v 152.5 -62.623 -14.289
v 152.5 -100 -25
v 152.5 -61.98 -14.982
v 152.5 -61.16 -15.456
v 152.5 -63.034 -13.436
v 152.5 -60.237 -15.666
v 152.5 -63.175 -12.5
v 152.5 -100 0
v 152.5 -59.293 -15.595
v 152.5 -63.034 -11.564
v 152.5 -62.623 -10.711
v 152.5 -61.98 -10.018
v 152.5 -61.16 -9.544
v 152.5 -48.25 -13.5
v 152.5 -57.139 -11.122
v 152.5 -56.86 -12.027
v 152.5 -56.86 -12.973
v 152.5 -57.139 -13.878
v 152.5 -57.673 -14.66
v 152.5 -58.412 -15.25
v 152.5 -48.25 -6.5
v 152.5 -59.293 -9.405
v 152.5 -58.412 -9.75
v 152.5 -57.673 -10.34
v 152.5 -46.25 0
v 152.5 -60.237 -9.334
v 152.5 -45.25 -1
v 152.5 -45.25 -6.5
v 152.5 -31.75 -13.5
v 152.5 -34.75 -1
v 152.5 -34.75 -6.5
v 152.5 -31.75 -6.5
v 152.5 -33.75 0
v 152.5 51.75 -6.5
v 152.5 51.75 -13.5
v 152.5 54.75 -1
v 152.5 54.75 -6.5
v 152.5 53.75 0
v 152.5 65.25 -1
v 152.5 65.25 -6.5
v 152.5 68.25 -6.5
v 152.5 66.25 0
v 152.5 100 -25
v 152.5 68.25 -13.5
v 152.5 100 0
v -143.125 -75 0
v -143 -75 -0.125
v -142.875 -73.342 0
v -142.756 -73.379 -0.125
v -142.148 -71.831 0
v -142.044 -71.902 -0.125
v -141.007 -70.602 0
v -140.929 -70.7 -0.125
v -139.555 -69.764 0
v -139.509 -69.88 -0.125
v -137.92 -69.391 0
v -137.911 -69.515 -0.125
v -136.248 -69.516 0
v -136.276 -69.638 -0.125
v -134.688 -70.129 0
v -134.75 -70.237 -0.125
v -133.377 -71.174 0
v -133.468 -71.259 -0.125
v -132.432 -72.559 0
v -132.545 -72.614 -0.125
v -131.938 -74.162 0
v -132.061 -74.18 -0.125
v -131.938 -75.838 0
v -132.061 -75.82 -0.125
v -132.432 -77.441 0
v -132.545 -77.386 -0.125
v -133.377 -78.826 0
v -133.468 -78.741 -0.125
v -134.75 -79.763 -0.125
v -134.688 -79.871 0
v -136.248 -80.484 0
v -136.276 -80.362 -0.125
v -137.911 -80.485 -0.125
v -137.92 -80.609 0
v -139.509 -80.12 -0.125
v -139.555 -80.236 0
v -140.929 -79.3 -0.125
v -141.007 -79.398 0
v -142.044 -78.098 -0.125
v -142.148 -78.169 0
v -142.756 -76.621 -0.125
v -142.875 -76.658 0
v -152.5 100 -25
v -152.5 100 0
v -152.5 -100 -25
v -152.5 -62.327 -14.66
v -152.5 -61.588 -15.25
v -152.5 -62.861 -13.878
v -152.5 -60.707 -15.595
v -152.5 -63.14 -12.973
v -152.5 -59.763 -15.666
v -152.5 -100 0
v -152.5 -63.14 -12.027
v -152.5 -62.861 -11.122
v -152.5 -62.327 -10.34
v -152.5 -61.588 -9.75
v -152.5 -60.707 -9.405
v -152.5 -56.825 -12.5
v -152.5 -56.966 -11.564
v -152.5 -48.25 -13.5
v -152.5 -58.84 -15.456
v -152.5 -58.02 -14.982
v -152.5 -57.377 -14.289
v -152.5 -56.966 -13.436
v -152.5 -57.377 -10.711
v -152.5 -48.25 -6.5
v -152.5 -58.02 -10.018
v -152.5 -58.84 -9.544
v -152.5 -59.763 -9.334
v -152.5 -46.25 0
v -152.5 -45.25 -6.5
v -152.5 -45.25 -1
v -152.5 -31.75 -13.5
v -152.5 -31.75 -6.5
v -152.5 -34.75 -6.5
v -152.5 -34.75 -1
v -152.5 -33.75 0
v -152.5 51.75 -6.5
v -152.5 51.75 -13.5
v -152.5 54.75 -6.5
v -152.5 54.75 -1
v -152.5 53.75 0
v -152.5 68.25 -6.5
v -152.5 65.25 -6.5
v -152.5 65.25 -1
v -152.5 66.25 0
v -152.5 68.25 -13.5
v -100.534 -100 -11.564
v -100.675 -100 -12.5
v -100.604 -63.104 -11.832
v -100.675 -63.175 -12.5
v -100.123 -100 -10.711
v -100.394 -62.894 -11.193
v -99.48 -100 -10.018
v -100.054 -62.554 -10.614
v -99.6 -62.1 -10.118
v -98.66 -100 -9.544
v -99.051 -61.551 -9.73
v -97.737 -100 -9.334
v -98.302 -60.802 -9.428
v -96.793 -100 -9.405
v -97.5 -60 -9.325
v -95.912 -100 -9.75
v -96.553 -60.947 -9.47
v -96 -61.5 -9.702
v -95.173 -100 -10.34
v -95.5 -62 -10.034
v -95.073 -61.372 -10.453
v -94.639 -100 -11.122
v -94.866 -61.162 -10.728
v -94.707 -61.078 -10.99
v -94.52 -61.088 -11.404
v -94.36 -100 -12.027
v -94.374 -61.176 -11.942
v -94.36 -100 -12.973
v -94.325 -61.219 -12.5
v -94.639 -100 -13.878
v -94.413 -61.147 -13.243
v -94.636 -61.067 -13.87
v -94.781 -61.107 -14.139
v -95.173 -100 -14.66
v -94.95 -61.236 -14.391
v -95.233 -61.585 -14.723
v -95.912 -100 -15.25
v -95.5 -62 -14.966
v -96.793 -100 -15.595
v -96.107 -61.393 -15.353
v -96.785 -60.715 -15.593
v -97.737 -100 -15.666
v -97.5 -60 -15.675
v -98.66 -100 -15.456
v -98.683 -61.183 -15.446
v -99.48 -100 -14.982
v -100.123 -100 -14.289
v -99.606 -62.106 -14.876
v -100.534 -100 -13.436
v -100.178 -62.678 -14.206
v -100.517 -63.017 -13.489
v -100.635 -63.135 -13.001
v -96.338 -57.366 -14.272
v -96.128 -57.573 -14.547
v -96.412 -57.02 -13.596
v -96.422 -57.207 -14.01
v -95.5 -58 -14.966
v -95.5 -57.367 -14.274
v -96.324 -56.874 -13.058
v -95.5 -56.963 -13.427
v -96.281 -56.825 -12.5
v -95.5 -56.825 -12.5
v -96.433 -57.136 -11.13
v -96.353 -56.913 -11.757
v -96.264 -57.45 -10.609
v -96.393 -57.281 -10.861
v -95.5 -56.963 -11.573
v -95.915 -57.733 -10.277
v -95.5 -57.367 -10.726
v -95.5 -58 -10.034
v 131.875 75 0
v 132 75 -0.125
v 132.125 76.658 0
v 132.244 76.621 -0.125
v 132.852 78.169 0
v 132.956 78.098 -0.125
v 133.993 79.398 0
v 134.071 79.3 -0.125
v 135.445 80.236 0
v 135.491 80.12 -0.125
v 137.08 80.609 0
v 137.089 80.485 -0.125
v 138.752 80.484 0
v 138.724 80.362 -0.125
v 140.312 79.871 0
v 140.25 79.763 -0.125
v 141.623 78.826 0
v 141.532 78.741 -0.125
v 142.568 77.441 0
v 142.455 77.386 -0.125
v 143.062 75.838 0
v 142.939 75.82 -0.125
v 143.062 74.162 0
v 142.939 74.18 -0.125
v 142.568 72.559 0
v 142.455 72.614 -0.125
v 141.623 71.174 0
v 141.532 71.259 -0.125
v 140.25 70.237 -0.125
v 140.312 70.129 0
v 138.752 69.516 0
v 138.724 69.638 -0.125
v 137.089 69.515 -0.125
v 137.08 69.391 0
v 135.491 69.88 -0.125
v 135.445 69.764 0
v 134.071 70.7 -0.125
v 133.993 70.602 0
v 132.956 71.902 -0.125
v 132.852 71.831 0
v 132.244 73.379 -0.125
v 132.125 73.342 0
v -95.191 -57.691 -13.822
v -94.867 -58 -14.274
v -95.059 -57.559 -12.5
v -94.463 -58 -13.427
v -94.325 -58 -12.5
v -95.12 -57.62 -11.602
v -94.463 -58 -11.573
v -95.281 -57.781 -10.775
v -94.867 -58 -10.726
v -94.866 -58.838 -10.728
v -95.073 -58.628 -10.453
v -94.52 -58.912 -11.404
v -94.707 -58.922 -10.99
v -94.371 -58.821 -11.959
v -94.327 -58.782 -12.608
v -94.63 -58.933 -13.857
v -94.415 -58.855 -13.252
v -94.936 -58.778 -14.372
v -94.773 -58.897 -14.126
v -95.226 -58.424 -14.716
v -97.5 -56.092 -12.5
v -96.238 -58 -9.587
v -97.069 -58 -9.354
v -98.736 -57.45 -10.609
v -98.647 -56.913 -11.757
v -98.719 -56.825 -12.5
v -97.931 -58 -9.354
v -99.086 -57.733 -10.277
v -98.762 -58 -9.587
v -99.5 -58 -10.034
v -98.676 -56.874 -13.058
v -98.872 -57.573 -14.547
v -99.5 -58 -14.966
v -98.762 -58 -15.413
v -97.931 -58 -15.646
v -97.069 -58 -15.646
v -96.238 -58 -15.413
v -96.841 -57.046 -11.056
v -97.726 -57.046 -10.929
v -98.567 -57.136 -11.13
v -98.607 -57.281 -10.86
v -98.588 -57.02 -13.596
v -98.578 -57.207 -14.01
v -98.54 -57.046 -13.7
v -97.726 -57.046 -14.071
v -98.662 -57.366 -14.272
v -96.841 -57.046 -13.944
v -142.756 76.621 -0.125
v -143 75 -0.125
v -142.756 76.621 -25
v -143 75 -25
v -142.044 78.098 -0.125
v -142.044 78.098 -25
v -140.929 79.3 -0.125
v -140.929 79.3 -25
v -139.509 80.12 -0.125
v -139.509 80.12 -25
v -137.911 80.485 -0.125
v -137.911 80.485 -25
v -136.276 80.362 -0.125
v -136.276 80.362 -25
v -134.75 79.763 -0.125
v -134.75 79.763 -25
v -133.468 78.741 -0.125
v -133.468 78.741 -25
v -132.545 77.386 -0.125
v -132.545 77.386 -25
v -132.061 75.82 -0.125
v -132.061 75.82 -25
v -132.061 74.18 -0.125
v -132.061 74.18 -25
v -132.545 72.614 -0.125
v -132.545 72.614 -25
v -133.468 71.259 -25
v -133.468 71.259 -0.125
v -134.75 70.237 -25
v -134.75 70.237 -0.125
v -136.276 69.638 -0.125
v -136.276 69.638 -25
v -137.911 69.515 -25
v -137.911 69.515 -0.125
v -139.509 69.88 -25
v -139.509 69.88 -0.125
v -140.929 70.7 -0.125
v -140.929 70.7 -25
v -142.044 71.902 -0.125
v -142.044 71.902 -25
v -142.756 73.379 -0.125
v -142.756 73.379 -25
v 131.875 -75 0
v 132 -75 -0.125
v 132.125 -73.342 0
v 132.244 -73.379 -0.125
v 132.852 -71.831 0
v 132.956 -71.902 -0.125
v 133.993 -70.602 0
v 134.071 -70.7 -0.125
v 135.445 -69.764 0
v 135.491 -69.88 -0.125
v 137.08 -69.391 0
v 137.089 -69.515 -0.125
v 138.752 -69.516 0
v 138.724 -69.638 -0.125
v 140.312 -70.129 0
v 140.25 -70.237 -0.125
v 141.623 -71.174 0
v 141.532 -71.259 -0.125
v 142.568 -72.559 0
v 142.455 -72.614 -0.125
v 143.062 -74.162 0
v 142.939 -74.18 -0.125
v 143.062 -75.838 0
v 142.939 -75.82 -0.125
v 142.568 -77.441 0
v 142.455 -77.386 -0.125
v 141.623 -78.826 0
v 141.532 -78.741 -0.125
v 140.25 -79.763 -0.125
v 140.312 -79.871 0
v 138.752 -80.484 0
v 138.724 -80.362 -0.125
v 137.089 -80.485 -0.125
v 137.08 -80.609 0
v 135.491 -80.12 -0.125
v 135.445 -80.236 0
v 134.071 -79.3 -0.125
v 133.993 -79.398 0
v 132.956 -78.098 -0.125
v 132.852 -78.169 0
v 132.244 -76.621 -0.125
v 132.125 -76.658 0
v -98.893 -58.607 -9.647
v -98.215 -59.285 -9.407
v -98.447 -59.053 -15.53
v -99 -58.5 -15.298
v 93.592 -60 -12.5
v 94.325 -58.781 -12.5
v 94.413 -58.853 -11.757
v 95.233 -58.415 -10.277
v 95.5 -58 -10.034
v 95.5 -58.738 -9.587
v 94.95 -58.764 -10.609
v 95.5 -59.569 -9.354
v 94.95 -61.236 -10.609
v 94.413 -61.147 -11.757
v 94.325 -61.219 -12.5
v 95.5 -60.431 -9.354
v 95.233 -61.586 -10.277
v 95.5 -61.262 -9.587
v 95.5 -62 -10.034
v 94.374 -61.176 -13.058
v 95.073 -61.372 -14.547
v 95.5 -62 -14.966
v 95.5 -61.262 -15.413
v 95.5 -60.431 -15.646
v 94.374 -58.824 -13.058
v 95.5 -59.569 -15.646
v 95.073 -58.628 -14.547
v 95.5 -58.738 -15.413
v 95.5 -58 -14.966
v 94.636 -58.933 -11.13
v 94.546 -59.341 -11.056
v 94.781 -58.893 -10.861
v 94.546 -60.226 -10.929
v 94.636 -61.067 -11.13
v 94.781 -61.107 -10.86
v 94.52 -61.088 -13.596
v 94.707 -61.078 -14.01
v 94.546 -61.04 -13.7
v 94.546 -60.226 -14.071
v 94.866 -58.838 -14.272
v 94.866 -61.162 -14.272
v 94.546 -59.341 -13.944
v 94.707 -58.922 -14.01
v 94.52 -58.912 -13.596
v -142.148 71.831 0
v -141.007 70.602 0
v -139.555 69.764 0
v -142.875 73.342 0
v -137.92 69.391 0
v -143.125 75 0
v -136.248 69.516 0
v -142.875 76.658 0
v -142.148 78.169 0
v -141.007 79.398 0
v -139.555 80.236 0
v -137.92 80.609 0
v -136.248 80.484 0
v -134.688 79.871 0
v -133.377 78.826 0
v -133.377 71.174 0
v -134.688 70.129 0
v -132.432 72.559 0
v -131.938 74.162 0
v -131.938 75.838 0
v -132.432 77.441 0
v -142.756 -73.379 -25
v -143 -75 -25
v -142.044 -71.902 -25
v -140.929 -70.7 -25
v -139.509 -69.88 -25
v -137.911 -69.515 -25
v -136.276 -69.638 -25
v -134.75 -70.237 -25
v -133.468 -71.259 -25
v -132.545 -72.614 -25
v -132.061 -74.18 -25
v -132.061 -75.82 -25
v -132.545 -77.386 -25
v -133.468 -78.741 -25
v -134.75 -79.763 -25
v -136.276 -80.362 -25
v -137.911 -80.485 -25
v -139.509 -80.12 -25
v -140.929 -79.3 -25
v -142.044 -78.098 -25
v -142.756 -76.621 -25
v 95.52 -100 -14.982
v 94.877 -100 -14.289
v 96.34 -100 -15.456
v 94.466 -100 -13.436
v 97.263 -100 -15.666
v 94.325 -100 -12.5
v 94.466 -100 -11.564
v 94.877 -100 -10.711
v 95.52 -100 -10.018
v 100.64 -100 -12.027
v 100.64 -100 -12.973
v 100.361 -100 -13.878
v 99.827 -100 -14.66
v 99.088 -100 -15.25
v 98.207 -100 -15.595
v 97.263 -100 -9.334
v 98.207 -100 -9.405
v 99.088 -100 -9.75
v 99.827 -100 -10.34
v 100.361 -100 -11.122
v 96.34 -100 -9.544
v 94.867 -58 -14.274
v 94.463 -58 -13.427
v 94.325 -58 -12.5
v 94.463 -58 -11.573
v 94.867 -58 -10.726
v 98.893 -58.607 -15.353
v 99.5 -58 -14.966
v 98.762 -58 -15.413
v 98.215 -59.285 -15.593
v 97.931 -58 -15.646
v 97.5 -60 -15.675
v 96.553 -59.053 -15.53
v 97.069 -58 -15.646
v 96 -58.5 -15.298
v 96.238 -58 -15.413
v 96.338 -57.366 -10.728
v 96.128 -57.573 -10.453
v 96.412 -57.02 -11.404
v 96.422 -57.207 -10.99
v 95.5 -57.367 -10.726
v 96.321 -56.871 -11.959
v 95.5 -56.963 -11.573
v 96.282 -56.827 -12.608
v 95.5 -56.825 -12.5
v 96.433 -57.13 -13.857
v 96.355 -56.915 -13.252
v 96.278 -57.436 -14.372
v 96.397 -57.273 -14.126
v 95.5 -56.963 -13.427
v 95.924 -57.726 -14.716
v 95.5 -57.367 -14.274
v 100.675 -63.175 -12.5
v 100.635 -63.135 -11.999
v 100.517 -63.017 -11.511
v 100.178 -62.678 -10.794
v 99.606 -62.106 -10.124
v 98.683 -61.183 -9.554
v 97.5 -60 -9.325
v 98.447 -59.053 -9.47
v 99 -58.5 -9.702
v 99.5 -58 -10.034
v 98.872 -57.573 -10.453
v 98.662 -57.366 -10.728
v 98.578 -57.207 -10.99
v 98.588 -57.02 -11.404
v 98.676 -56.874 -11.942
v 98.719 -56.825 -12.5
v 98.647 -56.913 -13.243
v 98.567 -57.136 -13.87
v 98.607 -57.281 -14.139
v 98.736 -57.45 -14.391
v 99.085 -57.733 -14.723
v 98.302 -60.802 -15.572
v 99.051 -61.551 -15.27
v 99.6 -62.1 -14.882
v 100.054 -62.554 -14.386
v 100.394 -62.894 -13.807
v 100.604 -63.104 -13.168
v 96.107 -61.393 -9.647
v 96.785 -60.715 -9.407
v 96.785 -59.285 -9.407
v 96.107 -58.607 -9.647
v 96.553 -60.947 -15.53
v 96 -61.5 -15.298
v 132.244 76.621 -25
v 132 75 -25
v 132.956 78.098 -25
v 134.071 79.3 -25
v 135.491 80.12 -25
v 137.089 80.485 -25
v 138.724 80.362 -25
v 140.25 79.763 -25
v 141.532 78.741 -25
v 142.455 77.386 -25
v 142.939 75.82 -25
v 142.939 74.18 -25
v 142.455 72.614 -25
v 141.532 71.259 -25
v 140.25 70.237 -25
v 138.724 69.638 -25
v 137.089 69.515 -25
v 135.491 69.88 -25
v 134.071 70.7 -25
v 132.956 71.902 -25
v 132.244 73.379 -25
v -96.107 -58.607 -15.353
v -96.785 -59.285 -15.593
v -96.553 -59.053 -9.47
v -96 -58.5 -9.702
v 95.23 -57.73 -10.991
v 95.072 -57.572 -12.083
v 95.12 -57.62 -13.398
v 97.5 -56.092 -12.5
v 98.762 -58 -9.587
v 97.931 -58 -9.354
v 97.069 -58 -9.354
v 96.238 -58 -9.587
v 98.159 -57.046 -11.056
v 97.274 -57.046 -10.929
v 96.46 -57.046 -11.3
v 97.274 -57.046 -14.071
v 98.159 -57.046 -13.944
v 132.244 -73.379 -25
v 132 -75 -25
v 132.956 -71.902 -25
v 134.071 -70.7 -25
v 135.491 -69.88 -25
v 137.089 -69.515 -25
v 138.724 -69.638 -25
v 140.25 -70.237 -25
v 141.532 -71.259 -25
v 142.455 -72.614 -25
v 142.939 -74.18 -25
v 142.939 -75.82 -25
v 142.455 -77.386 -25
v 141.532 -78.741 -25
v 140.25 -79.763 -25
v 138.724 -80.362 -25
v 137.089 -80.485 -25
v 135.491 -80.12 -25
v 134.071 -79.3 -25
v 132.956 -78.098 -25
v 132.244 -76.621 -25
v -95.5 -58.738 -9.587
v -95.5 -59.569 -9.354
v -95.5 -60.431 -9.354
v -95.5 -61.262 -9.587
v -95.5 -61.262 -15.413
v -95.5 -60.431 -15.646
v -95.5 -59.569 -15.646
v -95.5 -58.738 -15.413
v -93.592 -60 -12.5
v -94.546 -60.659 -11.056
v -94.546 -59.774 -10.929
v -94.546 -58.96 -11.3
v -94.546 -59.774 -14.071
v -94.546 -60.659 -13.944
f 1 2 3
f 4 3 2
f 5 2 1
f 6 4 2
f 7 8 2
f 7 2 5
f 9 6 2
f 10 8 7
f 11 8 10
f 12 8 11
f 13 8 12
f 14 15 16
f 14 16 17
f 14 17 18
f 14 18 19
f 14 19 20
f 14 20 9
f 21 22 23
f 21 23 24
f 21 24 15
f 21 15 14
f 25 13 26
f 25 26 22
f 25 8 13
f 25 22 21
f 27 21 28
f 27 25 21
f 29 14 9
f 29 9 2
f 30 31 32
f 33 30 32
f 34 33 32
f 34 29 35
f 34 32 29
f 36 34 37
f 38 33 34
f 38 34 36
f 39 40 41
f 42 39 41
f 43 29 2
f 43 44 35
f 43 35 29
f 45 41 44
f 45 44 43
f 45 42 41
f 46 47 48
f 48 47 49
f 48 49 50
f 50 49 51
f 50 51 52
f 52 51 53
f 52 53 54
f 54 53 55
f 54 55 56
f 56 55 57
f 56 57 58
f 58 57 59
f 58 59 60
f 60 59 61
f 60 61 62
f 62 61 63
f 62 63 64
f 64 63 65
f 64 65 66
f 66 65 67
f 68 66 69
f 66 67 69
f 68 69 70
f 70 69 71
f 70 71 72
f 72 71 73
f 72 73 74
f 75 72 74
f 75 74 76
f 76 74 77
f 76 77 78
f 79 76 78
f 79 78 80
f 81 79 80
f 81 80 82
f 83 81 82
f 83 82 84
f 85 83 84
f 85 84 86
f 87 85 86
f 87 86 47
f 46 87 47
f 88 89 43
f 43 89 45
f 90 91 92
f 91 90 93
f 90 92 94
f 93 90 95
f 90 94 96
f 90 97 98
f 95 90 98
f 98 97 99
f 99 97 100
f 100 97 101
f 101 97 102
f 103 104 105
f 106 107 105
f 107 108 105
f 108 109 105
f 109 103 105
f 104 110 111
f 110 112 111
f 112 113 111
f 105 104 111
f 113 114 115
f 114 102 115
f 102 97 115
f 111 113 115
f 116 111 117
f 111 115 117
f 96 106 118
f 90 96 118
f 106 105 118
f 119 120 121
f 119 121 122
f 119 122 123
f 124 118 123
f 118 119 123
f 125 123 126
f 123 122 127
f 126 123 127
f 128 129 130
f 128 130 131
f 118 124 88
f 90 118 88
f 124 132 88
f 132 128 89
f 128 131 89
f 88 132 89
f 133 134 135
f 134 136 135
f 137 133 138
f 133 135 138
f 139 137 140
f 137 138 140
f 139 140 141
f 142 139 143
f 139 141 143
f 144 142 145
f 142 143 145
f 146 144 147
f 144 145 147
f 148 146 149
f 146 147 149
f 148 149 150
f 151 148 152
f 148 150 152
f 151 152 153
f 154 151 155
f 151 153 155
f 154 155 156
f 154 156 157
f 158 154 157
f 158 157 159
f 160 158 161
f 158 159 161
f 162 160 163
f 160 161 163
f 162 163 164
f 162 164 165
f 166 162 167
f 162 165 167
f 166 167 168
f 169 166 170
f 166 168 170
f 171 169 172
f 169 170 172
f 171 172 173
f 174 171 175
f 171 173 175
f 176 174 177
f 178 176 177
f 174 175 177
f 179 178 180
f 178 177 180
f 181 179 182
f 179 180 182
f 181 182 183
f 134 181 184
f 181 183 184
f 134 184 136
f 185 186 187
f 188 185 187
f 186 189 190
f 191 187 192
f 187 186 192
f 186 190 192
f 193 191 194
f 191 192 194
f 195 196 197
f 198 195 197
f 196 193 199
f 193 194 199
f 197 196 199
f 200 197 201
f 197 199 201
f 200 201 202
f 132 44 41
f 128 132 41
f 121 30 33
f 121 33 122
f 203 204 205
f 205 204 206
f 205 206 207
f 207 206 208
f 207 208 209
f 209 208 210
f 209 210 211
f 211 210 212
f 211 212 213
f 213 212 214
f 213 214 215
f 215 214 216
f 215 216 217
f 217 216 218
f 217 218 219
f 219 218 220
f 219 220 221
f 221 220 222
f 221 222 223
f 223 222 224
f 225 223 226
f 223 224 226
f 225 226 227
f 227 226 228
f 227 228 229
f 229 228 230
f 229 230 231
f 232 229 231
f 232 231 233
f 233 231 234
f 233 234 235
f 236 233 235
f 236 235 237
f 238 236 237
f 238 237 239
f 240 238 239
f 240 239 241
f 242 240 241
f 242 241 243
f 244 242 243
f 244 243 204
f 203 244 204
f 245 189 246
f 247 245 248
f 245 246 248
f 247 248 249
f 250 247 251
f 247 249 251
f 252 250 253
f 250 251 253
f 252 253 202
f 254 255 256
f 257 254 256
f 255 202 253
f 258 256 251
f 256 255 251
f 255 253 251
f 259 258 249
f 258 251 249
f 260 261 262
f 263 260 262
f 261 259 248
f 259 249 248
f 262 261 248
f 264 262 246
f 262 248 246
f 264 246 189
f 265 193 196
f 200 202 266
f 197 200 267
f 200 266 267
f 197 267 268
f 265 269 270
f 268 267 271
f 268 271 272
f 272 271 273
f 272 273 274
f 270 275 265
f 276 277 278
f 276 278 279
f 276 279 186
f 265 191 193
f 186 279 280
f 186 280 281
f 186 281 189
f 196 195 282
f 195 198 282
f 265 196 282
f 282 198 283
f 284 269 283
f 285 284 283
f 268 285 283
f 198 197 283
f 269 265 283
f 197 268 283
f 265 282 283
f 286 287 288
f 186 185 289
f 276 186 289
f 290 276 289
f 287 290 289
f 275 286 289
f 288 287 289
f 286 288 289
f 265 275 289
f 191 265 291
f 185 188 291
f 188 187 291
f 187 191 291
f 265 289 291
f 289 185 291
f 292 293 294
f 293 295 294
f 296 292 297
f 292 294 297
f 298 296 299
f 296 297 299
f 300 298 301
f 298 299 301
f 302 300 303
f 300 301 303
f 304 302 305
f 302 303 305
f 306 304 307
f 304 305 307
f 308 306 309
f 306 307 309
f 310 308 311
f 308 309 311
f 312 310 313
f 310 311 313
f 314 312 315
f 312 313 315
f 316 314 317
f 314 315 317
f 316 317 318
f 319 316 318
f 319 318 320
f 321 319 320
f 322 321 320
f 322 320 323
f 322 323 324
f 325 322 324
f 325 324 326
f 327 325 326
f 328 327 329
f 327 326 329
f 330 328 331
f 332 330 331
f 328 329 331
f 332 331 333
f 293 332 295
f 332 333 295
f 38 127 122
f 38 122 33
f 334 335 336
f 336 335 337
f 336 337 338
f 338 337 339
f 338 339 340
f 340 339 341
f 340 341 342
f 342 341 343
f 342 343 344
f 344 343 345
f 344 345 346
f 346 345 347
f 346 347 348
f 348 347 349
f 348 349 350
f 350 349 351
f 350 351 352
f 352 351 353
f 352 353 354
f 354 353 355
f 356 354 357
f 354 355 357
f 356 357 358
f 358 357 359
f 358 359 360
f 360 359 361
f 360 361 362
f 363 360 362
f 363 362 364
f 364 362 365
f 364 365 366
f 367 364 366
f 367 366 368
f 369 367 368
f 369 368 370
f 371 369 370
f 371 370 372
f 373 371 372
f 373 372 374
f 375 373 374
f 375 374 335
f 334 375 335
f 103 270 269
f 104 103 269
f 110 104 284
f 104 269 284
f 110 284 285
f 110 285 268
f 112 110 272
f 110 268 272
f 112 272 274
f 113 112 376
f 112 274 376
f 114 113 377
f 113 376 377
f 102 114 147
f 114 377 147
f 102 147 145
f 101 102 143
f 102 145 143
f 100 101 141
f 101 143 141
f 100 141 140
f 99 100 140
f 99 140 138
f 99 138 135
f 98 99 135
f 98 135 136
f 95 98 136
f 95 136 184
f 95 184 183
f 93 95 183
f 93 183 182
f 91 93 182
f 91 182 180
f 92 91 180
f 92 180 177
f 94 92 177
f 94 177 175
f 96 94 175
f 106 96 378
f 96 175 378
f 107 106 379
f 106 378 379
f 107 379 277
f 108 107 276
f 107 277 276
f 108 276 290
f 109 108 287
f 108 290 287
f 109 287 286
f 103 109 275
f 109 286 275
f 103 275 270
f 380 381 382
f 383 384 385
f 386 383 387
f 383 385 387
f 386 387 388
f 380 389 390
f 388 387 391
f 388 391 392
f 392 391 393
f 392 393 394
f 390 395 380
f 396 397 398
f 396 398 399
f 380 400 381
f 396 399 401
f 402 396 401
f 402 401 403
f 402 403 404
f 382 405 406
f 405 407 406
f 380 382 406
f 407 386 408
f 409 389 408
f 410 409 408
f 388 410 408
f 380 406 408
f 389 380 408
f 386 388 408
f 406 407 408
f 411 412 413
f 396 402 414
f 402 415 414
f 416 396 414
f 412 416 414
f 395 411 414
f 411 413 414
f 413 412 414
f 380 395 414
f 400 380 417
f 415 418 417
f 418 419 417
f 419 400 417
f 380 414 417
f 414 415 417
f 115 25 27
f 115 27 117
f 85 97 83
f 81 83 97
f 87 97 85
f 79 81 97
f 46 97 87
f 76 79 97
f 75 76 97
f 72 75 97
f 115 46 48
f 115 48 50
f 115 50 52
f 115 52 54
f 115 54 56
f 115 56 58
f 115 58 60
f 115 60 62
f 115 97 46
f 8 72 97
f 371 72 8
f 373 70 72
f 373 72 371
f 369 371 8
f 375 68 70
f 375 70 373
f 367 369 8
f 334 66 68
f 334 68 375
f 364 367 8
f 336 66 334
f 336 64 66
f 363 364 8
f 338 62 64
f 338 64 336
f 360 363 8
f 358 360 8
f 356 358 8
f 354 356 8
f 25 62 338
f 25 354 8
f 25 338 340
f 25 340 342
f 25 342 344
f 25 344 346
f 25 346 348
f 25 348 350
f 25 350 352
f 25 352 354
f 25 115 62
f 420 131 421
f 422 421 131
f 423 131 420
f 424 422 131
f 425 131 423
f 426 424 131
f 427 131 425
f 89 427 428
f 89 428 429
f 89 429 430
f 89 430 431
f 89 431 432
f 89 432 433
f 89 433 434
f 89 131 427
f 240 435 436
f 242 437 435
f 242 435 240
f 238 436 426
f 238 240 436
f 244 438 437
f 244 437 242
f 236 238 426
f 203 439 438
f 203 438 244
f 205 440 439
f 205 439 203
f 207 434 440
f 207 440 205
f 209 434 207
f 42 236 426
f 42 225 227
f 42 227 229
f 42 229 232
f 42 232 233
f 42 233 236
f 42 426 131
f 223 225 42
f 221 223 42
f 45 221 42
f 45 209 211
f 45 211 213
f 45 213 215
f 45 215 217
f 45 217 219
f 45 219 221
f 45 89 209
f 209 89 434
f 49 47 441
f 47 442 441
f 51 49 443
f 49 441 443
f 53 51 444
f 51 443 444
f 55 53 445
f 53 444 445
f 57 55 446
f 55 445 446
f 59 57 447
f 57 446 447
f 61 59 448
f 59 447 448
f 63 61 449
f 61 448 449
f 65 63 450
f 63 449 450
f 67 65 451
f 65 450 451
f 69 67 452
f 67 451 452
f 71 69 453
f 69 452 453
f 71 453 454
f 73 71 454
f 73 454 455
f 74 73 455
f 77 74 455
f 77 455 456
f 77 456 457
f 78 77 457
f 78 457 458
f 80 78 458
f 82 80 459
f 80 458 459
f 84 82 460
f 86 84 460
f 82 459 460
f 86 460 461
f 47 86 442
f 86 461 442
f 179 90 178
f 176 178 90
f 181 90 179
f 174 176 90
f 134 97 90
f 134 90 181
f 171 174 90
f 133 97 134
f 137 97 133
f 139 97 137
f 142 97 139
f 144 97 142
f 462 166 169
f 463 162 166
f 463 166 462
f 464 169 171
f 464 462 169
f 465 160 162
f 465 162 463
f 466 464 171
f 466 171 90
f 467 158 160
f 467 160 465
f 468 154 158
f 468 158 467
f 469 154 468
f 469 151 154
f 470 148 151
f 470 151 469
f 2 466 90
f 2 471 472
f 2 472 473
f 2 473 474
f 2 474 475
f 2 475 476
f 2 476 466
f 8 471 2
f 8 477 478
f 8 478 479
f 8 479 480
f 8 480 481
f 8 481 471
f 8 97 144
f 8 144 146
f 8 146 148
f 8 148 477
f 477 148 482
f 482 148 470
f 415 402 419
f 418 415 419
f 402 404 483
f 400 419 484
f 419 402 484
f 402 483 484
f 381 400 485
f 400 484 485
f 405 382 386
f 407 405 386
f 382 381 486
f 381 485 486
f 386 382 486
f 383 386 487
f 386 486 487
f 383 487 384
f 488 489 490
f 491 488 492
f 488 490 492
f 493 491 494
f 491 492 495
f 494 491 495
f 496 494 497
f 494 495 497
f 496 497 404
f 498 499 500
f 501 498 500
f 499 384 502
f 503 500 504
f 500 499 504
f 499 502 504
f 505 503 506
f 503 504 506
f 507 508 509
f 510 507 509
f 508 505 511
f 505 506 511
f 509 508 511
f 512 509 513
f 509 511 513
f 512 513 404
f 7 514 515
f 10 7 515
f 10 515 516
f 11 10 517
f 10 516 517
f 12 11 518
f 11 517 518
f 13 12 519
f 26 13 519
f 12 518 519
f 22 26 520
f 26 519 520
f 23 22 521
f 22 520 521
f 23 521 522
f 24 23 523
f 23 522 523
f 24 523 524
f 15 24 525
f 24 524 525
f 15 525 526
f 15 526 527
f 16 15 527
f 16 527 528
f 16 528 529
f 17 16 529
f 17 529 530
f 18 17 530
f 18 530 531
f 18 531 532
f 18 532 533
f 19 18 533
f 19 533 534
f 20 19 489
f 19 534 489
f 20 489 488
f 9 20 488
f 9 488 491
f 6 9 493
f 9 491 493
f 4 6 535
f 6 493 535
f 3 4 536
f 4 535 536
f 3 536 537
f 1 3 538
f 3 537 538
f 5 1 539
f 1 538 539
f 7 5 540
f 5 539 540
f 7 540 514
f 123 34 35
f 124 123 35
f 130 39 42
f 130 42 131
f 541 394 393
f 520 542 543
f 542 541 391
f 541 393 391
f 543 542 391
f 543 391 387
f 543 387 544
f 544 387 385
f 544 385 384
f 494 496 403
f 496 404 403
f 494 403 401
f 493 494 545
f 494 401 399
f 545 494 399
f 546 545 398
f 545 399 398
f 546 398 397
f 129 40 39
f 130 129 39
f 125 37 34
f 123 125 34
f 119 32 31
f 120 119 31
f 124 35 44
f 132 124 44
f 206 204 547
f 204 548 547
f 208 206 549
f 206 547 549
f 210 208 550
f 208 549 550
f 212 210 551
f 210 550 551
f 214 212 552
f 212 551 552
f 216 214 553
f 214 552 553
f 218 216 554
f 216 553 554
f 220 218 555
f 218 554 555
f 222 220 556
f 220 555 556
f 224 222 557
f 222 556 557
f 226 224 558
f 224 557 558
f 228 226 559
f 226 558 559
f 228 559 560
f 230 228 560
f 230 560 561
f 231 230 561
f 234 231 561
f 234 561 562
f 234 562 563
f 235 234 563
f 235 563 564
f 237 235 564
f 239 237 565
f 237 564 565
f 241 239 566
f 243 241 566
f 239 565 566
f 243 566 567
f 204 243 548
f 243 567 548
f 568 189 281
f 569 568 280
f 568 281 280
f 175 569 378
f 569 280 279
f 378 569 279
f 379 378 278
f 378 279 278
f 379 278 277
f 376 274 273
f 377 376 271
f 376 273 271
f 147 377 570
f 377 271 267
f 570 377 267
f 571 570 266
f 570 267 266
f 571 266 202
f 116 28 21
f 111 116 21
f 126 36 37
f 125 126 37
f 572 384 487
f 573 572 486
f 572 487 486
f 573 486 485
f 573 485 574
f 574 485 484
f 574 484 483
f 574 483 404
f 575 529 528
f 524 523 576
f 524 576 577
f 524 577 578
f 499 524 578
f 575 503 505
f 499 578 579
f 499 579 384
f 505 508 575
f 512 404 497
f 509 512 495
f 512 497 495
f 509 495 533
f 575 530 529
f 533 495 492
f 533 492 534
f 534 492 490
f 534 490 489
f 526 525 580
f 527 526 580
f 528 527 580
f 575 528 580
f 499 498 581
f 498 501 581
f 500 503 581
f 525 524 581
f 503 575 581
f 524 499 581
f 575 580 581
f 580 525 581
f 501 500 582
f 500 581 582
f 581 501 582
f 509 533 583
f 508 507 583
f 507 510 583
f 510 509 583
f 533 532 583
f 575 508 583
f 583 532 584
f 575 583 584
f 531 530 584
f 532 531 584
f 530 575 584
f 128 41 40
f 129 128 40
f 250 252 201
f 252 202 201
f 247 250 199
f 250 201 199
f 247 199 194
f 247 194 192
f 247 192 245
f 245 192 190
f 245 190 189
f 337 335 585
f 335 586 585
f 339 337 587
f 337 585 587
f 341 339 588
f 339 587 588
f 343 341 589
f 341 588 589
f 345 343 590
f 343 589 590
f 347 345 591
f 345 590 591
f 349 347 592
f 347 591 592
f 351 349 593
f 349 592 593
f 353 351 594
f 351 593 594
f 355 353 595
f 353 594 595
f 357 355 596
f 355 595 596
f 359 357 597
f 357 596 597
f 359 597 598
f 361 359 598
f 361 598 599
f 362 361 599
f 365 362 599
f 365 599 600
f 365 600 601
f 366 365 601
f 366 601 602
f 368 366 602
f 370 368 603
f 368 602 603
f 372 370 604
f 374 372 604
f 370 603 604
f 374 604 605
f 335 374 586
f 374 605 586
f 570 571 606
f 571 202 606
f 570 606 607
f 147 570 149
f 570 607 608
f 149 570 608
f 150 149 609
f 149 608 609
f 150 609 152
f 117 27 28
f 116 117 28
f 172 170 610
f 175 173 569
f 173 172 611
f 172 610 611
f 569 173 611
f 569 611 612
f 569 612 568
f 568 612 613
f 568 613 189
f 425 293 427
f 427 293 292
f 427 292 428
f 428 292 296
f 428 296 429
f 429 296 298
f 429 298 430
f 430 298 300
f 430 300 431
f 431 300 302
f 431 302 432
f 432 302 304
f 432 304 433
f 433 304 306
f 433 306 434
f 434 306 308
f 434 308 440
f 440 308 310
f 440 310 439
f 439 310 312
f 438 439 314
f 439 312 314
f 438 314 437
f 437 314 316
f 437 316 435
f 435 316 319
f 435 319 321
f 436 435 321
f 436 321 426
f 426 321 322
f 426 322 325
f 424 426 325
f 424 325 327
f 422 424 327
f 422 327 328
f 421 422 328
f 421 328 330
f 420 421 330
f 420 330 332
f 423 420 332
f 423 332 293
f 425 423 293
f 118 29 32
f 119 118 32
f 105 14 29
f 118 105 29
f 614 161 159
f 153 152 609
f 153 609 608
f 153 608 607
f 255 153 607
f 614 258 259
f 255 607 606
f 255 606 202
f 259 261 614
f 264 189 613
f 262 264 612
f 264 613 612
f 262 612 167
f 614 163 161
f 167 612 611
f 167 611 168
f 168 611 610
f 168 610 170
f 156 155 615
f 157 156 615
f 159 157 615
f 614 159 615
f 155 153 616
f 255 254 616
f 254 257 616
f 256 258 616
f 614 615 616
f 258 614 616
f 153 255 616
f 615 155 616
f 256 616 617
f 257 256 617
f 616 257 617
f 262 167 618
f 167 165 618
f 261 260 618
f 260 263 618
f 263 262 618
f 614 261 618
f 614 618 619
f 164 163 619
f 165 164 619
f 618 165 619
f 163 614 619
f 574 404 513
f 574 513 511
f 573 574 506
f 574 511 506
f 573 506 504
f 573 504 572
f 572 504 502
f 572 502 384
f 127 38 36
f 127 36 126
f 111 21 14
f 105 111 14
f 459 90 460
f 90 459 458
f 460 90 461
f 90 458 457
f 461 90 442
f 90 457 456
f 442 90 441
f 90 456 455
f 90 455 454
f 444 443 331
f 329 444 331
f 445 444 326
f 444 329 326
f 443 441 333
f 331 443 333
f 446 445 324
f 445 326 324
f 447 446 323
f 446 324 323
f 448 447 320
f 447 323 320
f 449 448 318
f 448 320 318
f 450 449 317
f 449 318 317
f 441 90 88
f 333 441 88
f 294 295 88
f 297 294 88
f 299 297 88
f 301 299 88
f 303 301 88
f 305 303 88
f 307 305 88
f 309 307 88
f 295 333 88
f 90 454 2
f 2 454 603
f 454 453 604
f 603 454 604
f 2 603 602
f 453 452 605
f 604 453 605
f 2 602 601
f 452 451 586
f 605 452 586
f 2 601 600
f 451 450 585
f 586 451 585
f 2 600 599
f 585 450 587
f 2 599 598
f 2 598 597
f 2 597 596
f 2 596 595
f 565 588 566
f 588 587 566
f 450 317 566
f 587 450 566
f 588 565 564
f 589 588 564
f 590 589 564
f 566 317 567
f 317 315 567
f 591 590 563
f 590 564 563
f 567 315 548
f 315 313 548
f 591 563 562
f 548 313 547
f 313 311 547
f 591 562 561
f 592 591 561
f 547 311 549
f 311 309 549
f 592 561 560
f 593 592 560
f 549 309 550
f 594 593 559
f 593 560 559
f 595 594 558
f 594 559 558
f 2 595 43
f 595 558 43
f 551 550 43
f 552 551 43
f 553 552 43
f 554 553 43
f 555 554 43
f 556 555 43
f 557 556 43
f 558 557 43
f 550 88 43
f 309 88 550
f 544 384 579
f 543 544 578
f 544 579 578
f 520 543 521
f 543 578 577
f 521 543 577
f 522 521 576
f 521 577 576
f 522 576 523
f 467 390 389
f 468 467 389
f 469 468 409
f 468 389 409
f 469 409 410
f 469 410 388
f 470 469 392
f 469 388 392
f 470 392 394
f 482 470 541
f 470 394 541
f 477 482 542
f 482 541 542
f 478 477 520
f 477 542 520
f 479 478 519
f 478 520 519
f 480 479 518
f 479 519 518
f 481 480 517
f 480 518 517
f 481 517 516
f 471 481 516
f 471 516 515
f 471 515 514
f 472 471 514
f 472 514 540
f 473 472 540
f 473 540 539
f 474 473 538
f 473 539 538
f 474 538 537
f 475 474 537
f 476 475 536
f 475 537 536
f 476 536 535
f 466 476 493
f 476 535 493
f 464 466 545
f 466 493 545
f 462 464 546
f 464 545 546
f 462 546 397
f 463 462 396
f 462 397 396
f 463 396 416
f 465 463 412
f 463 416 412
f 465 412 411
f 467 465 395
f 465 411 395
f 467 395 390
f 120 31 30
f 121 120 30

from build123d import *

# Parameters (mm, degrees)
F0_W            = 305
F0_H            = 200
F1_DEPTH        = 25
F3_D            = 11
F3_CSINK_D      = 11.25
F3_CSINK_ANGLE  = 90
F5_DEPTH        = 152.501
F5_DEPTH_BACK   = 152.501
F6_SIZE         = 1
F10_D           = 6.35
F10_DEPTH       = 42
F10_TIP         = 1.9077324654
F11_D           = 6.35
F11_DEPTH       = 57
F11_TIP         = 1.9077324654
F11_ON_F8_D     = 6.35
F11_ON_F8_DEPTH = 57
F11_ON_F8_TIP   = 1.9077324654


with BuildPart() as f1:
    # F0 (on Top) → F1 (new body)
    with BuildSketch(Plane.XY):
        Rectangle(F0_W, F0_H)
    extrude(amount=-F1_DEPTH)

    # F3 (through all)
    with Locations(Plane.XY):
        with Locations((-137.5, 75), (137.5, 75), (137.5, -75), (-137.5, -75)):
            CounterSinkHole(F3_D / 2, F3_CSINK_D / 2, counter_sink_angle=F3_CSINK_ANGLE)

    # F4 (on Right) → F5 (cut, two sides)
    with BuildSketch(Plane.YZ) as f5_sk:
        Polygon((-34.75, 0), (-40, 0), (-45.25, 0), (-45.25, -6.5), (-48.25, -6.5), (-48.25, -13.5), (-40, -13.5), (-31.75, -13.5), (-31.75, -6.5), (-34.75, -6.5), align=None)
        Polygon((65.25, 0), (60, 0), (54.75, 0), (54.75, -6.5), (51.75, -6.5), (51.75, -13.5), (60, -13.5), (68.25, -13.5), (68.25, -6.5), (65.25, -6.5), align=None)
    extrude(amount=-F5_DEPTH, mode=Mode.SUBTRACT)
    extrude(f5_sk.sketch, amount=F5_DEPTH_BACK, mode=Mode.SUBTRACT)

    # F6
    f6_edges = [f1.edges().sort_by_distance(p)[0] for p in [
        (0, -34.75, 0),
        (0, -45.25, 0),
        (0, 65.25, 0),
        (0, 54.75, 0),
    ]]
    chamfer(f6_edges, length=F6_SIZE)

    # F10
    with Locations(Plane.XZ.offset(100)):
        with Locations((97.5, -12.5), (-97.5, -12.5)):
            Hole(F10_D / 2, depth=F10_DEPTH)
            with Locations((0, 0, -(F10_DEPTH + F10_TIP / 2))):  # 118° drill point
                Cone(0, F10_D / 2, F10_TIP, mode=Mode.SUBTRACT)

    # F11
    with Locations(Plane(origin=(-152.5, 0, 0), x_dir=(0, -1, 0), z_dir=(-1, 0, 0))):
        with Locations((60, -12.5)):
            Hole(F11_D / 2, depth=F11_DEPTH)
            with Locations((0, 0, -(F11_DEPTH + F11_TIP / 2))):  # 118° drill point
                Cone(0, F11_D / 2, F11_TIP, mode=Mode.SUBTRACT)

    # F11 on F8
    with Locations(Plane.YZ.offset(152.5)):
        with Locations((-60, -12.5)):
            Hole(F11_ON_F8_D / 2, depth=F11_ON_F8_DEPTH)
            with Locations((0, 0, -(F11_ON_F8_DEPTH + F11_ON_F8_TIP / 2))):  # 118° drill point
                Cone(0, F11_ON_F8_D / 2, F11_ON_F8_TIP, mode=Mode.SUBTRACT)


solid = f1.part
